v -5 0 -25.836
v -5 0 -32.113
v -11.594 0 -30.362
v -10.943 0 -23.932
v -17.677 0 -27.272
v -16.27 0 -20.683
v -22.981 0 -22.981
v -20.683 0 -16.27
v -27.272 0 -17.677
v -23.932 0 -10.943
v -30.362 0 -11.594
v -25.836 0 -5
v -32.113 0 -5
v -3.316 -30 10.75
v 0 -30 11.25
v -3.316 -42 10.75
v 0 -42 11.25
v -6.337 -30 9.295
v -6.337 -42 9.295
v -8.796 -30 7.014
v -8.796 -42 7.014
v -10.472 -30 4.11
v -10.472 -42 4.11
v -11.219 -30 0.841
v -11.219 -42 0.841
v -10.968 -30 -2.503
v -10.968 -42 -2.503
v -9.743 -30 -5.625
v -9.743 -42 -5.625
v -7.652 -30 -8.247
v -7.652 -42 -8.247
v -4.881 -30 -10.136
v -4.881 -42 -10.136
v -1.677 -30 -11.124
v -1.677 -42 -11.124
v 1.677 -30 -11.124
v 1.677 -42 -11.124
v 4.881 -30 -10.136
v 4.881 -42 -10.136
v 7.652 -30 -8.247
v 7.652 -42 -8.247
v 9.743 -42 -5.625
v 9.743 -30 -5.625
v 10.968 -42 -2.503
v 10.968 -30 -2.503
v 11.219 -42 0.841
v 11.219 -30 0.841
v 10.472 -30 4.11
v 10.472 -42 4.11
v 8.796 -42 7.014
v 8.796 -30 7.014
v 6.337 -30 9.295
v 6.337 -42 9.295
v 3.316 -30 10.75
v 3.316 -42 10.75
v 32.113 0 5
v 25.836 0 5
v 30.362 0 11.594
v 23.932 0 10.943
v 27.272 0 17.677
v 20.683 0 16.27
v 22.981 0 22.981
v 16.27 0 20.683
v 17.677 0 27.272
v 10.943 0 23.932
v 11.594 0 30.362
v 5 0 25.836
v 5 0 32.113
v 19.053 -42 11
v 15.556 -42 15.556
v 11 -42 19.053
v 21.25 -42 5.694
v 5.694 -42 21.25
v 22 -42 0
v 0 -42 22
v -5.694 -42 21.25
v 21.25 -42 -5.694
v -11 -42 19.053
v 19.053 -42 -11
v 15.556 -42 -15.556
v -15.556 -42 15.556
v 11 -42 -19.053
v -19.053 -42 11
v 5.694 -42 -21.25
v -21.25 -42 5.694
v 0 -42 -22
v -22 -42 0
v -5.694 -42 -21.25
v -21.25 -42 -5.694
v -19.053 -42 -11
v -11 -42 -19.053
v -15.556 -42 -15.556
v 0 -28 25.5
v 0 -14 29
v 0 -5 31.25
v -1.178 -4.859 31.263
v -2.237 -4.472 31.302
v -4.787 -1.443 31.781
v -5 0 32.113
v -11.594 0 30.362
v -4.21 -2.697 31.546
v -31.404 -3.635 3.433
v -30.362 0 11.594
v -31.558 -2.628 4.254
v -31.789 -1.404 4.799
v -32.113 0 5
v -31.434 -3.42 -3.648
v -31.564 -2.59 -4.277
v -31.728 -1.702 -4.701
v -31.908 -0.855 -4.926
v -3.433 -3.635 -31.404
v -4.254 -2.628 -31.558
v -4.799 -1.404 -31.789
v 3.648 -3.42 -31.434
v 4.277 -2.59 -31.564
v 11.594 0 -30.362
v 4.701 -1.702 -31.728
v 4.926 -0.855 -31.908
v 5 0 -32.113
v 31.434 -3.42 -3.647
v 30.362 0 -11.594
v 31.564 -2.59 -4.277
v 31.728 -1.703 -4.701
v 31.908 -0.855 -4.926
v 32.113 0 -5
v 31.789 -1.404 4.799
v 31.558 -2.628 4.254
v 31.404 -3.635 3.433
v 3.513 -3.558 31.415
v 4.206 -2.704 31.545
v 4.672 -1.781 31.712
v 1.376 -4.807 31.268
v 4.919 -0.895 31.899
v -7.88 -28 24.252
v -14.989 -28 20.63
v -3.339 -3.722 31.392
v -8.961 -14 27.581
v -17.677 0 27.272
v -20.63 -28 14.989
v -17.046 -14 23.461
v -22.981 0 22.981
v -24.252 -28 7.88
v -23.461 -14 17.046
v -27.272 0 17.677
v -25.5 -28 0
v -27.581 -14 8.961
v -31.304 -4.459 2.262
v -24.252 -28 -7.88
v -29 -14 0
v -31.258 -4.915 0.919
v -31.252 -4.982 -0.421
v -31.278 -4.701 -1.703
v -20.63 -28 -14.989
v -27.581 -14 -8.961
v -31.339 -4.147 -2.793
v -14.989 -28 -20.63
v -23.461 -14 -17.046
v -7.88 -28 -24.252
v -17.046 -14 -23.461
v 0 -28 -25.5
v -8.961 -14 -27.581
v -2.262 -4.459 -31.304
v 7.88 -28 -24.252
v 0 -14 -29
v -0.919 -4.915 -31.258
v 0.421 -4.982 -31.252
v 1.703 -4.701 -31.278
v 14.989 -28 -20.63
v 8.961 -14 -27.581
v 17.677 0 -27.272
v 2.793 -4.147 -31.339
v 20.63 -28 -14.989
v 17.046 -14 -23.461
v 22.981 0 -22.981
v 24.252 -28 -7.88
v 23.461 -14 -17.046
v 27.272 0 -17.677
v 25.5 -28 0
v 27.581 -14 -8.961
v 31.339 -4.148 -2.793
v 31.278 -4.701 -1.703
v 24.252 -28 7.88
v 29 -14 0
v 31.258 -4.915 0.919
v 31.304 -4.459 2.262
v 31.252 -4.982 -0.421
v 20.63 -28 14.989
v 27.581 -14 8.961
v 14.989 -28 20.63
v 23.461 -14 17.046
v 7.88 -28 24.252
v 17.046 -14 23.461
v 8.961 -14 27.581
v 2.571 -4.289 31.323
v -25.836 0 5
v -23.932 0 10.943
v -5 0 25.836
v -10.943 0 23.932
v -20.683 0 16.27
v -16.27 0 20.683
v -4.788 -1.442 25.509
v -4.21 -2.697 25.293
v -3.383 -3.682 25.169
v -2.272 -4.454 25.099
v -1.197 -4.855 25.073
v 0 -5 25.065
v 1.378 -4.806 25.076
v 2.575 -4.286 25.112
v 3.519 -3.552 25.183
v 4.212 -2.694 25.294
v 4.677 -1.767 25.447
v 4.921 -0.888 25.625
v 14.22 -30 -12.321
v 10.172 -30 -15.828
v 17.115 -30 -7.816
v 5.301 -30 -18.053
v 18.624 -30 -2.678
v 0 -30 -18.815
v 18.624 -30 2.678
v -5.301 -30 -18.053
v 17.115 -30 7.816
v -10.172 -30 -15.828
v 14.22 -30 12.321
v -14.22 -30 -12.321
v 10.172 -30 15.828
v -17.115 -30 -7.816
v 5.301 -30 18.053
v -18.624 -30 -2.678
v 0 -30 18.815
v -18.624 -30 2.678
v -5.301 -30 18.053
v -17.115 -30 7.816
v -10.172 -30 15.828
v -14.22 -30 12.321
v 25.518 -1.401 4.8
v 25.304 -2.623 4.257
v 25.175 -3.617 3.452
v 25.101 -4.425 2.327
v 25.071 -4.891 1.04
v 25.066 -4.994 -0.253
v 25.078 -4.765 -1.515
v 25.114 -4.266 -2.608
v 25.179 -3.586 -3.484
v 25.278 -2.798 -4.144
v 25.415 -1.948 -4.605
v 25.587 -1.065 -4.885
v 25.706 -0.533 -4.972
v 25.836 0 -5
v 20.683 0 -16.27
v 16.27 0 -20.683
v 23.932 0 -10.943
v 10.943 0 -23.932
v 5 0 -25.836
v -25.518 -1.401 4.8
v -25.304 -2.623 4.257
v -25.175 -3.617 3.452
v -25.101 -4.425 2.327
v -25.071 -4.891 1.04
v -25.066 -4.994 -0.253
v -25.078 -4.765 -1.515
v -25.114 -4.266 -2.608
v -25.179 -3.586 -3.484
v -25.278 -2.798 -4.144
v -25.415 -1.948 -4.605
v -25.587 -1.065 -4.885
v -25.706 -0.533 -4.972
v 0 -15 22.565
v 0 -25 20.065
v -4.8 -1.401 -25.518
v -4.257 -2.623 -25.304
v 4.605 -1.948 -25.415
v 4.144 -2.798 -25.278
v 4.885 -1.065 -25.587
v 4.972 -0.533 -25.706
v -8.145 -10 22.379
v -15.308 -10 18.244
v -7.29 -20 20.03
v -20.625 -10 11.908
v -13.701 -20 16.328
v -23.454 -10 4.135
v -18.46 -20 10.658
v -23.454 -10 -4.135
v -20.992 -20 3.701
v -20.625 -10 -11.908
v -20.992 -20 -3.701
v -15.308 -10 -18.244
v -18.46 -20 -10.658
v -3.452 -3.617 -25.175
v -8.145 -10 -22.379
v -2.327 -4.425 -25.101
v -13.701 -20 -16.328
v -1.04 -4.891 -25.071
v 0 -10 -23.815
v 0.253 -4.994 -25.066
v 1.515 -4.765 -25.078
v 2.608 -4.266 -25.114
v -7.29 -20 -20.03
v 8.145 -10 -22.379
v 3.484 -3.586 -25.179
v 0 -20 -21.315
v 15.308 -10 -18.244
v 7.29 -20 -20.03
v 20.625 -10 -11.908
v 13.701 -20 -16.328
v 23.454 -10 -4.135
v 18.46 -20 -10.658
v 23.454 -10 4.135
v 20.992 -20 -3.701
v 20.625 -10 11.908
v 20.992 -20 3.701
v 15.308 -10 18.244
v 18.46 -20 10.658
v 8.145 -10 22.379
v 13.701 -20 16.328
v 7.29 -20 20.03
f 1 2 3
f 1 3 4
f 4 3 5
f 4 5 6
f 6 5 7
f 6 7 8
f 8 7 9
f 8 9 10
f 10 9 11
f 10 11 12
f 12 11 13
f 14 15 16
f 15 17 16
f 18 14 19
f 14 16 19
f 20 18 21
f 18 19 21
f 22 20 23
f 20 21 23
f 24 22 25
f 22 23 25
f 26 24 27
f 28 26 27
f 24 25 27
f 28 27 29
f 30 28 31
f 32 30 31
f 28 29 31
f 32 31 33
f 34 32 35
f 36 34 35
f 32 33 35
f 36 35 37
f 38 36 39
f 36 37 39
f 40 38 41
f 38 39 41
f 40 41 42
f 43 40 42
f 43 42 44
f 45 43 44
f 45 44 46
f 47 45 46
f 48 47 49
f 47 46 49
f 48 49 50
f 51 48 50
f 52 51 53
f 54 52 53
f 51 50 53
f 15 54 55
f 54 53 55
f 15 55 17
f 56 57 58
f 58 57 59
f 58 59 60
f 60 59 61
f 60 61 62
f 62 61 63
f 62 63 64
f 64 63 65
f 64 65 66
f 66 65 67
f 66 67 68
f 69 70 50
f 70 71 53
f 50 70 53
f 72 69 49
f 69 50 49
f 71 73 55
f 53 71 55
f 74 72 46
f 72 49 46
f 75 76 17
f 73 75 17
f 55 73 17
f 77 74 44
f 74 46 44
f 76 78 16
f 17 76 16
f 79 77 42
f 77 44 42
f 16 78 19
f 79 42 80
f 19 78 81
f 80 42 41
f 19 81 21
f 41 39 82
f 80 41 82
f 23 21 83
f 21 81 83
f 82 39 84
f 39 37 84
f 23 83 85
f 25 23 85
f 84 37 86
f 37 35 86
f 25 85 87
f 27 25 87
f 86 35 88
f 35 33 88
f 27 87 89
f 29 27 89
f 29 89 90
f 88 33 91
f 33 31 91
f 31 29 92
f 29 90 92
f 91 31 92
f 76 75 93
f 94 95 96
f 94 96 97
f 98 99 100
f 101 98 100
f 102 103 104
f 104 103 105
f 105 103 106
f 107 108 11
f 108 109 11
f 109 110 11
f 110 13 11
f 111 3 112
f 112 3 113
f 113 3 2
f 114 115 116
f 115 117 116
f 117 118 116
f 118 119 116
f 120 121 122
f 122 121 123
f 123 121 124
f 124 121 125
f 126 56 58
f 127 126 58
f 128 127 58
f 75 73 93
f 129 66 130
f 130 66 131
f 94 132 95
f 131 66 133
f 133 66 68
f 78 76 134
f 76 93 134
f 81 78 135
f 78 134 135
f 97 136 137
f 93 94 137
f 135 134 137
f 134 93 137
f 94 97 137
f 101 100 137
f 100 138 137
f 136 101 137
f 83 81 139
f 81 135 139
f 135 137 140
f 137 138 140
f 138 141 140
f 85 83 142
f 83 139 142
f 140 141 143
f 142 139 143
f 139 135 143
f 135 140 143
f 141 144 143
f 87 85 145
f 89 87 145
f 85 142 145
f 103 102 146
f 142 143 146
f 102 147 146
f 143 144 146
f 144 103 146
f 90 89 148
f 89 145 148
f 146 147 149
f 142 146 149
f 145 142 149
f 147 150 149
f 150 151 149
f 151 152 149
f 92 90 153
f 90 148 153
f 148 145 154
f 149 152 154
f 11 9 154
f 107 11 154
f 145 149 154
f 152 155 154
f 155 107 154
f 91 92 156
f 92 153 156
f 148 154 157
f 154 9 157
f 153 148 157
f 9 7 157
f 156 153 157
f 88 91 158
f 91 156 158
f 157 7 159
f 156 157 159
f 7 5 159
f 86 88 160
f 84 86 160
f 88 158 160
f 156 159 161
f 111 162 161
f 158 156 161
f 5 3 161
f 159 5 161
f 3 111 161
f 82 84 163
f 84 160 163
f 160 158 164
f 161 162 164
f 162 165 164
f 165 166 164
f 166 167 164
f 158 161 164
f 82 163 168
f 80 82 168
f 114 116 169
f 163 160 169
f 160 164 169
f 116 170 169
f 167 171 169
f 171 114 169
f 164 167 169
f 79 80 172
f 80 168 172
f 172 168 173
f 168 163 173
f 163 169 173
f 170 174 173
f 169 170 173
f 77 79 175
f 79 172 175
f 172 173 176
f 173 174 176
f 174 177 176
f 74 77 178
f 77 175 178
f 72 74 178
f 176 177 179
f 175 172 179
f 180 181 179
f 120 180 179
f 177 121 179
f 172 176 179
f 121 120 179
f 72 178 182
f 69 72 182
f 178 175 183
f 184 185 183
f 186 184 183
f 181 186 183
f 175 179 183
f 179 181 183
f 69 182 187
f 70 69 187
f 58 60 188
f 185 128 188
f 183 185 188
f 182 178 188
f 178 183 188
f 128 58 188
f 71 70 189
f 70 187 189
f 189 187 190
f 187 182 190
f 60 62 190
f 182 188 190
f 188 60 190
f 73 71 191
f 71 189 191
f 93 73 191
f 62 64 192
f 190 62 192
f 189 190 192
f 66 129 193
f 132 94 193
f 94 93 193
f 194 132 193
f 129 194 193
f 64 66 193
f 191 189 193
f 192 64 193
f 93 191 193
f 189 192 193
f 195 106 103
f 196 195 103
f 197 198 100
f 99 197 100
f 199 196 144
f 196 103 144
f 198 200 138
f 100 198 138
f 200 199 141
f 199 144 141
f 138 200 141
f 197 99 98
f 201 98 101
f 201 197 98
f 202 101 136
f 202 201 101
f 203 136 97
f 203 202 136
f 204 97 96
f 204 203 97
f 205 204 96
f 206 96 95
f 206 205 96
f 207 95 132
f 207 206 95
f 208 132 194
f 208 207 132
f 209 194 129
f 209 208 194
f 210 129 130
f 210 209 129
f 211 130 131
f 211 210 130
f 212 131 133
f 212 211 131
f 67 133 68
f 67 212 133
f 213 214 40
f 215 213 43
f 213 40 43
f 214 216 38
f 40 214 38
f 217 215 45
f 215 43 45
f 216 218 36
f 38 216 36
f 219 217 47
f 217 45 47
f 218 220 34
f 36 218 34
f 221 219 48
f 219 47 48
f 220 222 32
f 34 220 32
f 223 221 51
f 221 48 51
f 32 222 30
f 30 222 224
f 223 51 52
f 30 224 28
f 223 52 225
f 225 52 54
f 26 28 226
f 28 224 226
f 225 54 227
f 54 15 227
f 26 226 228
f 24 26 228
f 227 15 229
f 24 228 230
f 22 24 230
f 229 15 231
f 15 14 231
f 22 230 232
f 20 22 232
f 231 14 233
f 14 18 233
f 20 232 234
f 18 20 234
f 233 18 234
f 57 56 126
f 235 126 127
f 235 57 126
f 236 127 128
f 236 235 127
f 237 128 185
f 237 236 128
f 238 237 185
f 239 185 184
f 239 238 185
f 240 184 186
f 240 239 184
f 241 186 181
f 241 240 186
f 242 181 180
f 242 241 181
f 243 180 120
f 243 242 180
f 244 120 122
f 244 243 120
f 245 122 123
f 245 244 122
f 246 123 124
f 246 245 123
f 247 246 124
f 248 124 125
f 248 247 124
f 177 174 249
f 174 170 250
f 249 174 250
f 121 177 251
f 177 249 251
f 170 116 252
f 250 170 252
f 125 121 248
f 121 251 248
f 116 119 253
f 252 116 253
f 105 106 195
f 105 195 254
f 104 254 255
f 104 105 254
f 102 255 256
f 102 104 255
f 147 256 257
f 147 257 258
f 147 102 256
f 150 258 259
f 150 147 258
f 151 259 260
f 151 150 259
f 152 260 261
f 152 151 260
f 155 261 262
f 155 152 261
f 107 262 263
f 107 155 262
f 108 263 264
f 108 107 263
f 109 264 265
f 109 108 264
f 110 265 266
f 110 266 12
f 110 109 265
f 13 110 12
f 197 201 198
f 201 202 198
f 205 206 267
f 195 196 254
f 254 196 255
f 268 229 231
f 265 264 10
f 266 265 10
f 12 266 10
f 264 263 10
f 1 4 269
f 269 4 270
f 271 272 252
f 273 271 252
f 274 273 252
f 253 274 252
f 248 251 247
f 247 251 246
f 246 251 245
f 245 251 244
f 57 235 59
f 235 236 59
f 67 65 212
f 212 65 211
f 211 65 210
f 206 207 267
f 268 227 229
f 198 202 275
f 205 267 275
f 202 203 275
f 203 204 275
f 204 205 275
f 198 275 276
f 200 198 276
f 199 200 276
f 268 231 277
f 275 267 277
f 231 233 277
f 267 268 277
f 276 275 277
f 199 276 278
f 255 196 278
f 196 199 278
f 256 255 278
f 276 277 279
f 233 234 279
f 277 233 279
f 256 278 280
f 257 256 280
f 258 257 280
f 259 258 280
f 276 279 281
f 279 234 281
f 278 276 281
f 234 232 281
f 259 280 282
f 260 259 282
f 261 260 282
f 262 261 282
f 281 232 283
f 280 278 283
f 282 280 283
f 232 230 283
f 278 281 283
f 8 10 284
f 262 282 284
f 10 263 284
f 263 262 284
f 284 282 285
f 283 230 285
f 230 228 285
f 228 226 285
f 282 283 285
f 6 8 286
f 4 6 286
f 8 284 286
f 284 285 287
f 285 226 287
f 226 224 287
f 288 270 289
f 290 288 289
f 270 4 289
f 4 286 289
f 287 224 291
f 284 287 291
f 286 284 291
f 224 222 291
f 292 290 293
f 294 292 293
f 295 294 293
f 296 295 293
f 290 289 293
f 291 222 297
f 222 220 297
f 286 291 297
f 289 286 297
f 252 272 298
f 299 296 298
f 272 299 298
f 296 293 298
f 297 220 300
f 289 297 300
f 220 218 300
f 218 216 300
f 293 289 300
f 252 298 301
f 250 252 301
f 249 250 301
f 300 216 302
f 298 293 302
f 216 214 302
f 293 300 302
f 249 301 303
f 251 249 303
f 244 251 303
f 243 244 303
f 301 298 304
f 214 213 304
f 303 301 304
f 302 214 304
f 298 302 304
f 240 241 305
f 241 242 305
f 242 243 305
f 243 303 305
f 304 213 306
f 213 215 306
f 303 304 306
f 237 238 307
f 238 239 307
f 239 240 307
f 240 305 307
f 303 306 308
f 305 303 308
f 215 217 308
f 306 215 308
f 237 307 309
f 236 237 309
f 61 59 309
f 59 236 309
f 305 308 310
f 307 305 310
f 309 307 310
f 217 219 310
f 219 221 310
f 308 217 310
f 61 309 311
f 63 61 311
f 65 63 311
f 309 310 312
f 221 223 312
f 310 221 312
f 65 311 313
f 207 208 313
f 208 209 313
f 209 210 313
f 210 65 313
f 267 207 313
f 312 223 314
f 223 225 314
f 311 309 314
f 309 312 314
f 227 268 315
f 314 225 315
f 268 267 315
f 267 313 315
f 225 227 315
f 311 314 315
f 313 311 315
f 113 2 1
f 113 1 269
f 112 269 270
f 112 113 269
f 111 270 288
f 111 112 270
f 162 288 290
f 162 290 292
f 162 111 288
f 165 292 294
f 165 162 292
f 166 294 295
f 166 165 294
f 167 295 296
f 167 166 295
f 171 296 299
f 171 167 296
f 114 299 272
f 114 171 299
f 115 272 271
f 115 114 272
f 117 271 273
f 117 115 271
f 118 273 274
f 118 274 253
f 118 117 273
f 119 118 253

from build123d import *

# Parameters (mm, degrees)
CUT_EXTRUDE2_DEPTH      = 63.261545114
CUT_EXTRUDE2_DEPTH_BACK = 63.261545114
SKETCH5_R               = 5
CUT_EXTRUDE3_DEPTH      = 63.060454569
CUT_EXTRUDE3_DEPTH_BACK = 63.060454569
SKETCH6_R               = 5


with BuildPart() as part:
    # Sketch2 → Revolve1 (revolve)
    with BuildSketch(Plane.XY, mode=Mode.PRIVATE) as revolve1_sk:
        Polygon((22, -42), (32.5, 0), (26.315341562, 0), (18.815341562, -30), (11.25, -30), (11.25, -42), align=None)
    revolve(revolve1_sk.sketch.rotate(Axis((0, 41.438546828, 0), (0, -1, 0)), 90), axis=Axis((0, 41.438546828, 0), (0, -1, 0)))

    # Sketch5 → Cut-Extrude2 (cut, two sides: drawn at the far end of the back side and taken through both)
    with BuildSketch(Plane.XY.offset(-CUT_EXTRUDE2_DEPTH_BACK)):
        Circle(SKETCH5_R)
    extrude(amount=CUT_EXTRUDE2_DEPTH + CUT_EXTRUDE2_DEPTH_BACK, mode=Mode.SUBTRACT)

    # Sketch6 → Cut-Extrude3 (cut, two sides: drawn at the far end of the back side and taken through both)
    with BuildSketch(Plane(origin=(0, 0, 0), x_dir=(0, 0, -1), z_dir=(1, 0, 0)).offset(-CUT_EXTRUDE3_DEPTH_BACK)):
        Circle(SKETCH6_R)
    extrude(amount=CUT_EXTRUDE3_DEPTH + CUT_EXTRUDE3_DEPTH_BACK, mode=Mode.SUBTRACT)


solid = part.part
